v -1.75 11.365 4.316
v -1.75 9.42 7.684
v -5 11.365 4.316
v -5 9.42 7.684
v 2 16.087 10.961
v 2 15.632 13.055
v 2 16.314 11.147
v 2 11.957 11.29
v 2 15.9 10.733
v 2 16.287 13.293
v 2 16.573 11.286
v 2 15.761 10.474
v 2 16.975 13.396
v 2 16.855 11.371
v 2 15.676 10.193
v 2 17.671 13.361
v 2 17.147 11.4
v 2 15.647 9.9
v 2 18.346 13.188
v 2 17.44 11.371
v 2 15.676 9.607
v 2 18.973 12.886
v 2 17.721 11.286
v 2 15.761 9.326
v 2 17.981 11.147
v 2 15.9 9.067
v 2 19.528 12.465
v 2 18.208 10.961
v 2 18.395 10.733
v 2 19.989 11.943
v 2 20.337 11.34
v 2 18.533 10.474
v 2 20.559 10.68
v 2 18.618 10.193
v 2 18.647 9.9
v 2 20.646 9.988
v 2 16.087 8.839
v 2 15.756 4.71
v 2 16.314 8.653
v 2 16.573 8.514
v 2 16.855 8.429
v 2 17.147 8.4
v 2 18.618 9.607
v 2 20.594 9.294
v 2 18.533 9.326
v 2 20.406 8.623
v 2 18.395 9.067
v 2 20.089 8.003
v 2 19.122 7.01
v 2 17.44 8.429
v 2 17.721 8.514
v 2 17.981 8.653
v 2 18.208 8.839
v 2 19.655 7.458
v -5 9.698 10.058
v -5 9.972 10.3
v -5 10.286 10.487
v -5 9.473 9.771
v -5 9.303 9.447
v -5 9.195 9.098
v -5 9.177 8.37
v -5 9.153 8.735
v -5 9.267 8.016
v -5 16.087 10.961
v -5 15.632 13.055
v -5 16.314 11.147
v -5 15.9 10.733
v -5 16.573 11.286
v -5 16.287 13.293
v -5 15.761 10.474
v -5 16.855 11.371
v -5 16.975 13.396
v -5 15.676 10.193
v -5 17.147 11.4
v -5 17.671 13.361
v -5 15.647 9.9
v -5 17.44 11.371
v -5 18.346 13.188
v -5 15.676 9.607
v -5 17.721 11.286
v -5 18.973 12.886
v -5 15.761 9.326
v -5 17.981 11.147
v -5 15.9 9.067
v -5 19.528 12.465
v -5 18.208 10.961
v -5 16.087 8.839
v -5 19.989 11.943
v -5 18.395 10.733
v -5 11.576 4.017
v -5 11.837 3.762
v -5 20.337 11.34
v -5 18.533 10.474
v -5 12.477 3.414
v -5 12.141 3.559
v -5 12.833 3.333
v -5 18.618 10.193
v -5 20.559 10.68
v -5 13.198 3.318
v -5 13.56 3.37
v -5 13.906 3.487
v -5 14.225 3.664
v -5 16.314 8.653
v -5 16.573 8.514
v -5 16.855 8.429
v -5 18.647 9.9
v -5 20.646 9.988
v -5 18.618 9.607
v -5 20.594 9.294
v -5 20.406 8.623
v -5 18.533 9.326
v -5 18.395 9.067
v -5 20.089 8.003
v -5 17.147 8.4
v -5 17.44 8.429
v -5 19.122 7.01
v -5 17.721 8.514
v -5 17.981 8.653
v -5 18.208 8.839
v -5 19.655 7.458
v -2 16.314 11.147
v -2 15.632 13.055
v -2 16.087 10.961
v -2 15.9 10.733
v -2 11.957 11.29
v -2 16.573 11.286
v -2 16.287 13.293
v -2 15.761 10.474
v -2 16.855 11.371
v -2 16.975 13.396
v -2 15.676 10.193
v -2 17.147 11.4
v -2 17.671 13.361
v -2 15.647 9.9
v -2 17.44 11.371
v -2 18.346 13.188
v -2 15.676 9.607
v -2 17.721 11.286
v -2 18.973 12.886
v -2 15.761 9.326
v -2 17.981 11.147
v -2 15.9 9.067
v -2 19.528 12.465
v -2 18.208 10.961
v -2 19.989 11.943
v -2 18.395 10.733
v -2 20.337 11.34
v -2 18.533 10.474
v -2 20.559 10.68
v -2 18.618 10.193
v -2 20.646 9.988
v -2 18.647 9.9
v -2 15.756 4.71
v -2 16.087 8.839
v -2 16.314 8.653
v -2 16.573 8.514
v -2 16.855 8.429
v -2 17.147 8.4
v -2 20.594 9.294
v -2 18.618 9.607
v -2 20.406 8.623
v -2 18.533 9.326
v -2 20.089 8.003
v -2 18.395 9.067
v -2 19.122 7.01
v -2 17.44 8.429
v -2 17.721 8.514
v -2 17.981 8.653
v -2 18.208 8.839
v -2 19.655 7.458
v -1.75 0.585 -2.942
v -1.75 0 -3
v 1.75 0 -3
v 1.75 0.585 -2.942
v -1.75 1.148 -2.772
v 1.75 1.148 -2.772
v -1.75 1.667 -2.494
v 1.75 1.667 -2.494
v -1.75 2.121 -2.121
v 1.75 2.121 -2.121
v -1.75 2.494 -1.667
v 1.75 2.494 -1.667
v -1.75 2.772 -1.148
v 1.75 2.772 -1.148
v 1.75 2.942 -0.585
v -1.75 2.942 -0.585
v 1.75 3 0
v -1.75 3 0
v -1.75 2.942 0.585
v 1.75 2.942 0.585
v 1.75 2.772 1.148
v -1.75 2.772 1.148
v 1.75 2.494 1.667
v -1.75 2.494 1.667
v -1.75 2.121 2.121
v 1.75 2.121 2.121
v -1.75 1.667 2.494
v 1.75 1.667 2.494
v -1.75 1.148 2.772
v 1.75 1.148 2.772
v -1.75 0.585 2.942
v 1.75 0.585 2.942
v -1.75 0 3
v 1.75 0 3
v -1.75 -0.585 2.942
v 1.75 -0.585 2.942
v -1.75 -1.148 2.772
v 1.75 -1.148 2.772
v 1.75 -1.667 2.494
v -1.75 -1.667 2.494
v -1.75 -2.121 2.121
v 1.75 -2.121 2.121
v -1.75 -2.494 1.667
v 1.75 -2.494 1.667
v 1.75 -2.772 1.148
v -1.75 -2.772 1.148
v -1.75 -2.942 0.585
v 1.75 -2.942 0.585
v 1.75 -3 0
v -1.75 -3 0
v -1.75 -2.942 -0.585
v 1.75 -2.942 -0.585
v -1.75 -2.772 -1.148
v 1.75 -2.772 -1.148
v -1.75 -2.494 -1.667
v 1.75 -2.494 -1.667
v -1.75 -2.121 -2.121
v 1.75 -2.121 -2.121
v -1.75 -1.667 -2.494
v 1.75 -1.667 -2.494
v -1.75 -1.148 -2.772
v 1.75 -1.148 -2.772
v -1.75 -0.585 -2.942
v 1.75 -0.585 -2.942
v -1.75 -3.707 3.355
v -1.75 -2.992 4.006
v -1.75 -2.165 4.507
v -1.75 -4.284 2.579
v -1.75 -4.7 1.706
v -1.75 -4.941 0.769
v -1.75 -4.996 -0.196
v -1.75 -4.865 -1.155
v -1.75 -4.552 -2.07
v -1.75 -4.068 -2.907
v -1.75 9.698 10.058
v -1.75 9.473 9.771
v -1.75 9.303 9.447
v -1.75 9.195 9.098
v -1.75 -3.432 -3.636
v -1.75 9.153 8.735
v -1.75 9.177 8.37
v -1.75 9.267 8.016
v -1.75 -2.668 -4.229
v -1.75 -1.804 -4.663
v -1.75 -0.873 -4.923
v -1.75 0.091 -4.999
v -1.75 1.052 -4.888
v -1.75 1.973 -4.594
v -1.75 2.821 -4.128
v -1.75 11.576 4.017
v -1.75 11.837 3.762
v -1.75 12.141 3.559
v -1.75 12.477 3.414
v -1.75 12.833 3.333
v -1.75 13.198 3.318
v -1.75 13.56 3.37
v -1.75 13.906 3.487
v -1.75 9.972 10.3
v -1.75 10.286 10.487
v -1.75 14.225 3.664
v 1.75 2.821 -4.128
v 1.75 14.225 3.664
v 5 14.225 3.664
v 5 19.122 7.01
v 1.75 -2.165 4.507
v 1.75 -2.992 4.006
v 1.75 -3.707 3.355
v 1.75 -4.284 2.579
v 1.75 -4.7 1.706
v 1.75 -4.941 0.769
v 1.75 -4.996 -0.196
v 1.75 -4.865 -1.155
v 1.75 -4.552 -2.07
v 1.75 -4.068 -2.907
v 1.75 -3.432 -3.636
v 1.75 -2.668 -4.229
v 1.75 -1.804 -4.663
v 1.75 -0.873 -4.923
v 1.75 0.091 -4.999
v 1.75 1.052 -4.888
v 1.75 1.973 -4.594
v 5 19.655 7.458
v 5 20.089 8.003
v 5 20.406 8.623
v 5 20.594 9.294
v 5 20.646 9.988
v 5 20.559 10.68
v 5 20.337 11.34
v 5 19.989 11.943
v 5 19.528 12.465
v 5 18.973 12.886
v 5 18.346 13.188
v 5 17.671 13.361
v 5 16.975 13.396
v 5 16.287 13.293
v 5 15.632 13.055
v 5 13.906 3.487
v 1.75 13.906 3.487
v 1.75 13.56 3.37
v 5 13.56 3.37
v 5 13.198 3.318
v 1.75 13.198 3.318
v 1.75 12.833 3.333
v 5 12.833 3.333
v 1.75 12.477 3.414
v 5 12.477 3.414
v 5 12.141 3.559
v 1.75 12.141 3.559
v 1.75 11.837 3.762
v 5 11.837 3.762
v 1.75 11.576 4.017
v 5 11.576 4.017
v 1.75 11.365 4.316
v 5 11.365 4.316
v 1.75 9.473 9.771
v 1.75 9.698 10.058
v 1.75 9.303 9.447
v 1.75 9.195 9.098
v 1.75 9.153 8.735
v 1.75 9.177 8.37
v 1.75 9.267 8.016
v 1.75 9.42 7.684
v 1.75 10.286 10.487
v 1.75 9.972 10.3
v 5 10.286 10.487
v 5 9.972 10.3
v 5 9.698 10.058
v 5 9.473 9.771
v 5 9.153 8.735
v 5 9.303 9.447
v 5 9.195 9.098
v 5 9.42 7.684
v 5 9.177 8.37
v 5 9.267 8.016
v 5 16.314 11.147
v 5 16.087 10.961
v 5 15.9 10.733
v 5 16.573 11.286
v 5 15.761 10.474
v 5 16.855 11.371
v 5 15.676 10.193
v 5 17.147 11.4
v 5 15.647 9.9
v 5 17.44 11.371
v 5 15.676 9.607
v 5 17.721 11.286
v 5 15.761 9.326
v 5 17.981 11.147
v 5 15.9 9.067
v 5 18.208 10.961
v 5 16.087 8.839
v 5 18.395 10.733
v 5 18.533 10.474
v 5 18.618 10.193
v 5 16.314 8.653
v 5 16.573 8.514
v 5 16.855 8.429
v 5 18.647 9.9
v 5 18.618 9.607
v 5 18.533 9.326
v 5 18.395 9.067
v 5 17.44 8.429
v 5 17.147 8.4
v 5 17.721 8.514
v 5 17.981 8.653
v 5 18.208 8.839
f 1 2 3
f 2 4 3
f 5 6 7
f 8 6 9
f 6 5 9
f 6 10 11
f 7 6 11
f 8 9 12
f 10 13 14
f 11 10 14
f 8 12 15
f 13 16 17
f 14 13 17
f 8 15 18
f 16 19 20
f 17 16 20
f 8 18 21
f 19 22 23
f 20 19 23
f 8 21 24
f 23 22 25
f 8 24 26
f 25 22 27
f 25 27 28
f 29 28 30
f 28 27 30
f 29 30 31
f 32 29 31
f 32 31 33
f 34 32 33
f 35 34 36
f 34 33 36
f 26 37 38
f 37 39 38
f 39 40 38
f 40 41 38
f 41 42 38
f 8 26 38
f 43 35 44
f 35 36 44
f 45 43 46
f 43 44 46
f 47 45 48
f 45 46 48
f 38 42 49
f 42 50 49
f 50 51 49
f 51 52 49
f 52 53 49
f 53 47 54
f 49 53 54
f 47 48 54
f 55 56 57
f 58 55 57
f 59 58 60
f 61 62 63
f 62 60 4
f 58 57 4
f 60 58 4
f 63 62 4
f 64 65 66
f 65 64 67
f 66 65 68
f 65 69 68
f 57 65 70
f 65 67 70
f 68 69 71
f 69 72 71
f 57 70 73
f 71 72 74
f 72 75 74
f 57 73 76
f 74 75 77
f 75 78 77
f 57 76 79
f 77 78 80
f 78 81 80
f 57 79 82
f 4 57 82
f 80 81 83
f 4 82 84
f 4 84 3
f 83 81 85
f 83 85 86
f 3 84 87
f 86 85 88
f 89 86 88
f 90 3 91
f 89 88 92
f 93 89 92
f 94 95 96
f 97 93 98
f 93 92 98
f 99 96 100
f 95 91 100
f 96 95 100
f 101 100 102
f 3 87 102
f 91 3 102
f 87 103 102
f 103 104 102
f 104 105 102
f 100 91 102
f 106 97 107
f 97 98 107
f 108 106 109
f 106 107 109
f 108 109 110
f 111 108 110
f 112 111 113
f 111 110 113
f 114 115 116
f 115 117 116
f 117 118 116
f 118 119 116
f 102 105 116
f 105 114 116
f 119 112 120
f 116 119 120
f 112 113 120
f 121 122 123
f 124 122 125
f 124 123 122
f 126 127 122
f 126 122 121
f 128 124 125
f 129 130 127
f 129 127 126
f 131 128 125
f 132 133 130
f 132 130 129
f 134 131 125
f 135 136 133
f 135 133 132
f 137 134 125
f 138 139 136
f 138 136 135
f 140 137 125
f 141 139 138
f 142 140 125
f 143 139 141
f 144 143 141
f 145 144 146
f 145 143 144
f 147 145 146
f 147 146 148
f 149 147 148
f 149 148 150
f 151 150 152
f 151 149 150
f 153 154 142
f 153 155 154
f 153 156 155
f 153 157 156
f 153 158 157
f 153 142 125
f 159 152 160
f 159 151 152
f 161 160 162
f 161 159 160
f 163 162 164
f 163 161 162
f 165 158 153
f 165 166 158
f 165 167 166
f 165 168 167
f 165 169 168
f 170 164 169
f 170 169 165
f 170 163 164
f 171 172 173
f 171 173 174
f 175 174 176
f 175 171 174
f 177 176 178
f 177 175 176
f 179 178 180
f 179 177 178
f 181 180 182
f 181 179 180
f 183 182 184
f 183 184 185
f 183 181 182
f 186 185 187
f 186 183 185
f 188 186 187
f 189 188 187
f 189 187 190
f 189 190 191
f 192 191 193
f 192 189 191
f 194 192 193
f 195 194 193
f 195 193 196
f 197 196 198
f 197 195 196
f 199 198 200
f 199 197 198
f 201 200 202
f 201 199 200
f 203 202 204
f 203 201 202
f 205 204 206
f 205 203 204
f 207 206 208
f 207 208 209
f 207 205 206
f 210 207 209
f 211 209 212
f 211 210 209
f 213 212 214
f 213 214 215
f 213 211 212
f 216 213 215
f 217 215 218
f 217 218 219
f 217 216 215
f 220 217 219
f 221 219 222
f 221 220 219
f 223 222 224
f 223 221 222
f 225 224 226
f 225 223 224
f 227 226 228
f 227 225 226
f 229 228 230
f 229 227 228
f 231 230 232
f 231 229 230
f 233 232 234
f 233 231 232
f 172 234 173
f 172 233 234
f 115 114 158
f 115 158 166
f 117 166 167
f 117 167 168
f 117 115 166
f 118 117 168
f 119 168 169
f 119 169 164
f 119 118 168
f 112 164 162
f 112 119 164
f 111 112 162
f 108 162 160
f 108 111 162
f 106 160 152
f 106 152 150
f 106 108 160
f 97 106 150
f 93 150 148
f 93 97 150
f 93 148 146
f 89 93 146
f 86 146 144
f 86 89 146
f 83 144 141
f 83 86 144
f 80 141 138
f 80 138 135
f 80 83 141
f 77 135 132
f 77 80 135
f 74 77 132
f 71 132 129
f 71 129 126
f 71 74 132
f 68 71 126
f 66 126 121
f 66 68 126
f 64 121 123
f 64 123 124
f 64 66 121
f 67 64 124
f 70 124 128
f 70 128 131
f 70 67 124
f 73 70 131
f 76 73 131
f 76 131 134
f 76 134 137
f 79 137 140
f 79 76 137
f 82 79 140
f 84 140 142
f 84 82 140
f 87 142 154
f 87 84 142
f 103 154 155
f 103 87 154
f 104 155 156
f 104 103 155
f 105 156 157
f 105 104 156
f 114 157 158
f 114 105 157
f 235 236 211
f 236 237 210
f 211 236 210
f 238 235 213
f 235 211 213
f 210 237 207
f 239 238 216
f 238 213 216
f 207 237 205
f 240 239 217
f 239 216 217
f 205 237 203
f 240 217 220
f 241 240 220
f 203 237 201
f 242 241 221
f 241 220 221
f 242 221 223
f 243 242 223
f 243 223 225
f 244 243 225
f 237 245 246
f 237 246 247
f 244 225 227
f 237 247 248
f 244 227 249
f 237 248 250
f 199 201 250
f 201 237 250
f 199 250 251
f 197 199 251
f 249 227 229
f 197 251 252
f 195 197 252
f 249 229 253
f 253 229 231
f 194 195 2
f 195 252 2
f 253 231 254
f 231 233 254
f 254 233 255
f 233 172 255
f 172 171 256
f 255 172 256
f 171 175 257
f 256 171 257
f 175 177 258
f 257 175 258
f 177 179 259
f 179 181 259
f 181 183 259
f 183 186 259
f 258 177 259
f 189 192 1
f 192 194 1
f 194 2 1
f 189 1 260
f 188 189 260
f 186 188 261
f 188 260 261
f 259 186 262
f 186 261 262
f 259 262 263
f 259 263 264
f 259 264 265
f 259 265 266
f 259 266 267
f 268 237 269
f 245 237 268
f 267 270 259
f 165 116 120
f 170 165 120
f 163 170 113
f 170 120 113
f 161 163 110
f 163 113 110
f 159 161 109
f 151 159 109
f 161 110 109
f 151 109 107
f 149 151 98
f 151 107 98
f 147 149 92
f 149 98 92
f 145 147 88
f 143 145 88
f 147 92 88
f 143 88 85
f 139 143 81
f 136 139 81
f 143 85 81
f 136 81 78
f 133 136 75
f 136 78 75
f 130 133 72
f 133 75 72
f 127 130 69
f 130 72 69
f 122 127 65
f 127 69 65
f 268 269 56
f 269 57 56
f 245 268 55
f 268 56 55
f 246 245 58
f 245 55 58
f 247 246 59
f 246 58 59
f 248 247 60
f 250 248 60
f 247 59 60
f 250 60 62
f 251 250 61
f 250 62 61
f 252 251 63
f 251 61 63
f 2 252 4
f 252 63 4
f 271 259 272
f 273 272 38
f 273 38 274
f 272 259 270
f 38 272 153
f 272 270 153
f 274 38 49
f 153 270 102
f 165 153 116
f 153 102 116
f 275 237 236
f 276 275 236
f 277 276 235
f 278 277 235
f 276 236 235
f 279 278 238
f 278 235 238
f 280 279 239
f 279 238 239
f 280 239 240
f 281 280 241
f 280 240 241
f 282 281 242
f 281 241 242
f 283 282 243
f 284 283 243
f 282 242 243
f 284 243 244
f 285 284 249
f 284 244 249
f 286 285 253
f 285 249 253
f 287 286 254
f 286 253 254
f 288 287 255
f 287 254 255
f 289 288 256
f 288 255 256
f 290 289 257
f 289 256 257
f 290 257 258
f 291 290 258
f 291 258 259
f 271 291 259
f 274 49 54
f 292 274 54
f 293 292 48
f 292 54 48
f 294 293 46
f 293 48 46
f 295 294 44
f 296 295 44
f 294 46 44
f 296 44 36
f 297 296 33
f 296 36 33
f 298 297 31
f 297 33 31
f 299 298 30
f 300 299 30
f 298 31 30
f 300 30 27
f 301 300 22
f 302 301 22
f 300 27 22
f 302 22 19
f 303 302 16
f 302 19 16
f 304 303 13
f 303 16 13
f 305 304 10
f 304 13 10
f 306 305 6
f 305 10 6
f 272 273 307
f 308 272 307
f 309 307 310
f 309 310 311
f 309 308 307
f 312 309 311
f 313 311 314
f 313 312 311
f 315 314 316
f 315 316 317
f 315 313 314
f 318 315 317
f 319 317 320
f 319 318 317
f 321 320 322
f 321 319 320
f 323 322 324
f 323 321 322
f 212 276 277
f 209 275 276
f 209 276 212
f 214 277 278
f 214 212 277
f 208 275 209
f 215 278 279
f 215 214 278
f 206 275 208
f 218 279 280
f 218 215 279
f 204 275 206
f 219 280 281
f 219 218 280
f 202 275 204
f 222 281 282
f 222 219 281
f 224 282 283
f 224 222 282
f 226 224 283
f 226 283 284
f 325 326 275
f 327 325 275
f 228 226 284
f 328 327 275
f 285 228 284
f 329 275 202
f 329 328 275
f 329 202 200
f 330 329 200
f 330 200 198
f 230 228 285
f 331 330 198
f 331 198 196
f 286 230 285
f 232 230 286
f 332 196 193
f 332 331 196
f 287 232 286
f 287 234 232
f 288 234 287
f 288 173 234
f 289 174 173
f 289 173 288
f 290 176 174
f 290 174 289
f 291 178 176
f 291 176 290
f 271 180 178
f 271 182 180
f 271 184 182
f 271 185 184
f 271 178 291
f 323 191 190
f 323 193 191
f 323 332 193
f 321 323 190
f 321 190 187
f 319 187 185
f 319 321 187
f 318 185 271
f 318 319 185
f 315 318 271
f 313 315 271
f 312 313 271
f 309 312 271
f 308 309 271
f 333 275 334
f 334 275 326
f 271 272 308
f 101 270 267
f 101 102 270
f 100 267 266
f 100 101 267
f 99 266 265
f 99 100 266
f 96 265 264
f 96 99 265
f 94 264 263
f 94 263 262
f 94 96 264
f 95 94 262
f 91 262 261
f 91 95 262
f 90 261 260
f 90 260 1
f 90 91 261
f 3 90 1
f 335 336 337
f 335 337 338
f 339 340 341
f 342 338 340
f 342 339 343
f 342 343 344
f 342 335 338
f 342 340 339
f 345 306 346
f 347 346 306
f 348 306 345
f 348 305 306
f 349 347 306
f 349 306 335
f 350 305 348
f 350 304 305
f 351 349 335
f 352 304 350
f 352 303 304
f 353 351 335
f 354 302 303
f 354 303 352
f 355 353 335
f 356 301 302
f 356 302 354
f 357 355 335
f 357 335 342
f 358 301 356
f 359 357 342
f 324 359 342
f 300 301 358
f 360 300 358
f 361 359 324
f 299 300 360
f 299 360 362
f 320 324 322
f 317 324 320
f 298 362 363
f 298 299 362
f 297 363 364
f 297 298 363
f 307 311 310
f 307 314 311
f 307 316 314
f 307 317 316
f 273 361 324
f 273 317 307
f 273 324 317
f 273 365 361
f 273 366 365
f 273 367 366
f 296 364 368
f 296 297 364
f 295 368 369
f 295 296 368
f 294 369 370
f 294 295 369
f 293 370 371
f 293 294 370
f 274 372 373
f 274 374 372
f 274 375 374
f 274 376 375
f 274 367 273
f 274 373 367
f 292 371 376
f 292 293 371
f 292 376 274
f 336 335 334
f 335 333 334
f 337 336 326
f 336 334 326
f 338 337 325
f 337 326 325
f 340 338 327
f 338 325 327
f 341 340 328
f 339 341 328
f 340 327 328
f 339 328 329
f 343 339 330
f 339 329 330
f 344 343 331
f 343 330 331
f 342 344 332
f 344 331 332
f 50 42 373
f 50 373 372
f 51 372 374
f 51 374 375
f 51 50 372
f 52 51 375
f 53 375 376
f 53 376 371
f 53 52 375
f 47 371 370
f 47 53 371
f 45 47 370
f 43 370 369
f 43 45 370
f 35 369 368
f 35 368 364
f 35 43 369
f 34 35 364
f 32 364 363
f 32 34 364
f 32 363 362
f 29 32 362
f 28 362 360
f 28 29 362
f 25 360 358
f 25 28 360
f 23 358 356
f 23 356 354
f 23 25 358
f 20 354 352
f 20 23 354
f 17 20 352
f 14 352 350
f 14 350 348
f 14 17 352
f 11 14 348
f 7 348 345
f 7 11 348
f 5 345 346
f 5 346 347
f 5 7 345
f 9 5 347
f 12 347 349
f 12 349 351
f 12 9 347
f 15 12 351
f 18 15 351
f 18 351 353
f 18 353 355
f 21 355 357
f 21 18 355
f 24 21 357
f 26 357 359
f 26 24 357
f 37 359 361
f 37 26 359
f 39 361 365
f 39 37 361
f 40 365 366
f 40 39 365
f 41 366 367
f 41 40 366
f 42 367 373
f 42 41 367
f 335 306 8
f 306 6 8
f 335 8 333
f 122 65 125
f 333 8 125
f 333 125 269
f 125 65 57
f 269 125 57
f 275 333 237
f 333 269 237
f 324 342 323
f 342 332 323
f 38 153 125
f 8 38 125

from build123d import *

# Parameters (mm, degrees)
BOSS_EXTRUDE1_DEPTH      = 1.75
BOSS_EXTRUDE1_DEPTH_BACK = 1.75
SKETCH1_R                = 5
SKETCH1_R_2              = 3
BOSS_EXTRUDE4_DEPTH      = 2
BOSS_EXTRUDE4_DEPTH_BACK = 2
BOSS_EXTRUDE2_START      = 2
SKETCH1_3_R              = 3.4999999999999996
SKETCH1_3_R_2            = 1.5000000000000024
BOSS_EXTRUDE2_DEPTH      = 3
BOSS_EXTRUDE3_START      = -5
SKETCH1_4_R              = 3.4999999999999996
SKETCH1_4_R_2            = 1.5000000000000024
BOSS_EXTRUDE3_DEPTH      = 3
FILLET2_R                = 2


with BuildPart() as part:
    # Sketch1 → Boss-Extrude1 (new, two sides: drawn at the far end of the back side and taken through both)
    # profile 1 of 3: a face of its own
    with BuildSketch(Plane(origin=(0, 0, 0), x_dir=(0, 0, -1), z_dir=(1, 0, 0)).offset(-BOSS_EXTRUDE1_DEPTH_BACK)):
        with BuildLine():
            Line((4.128289444917901, 2.820855589883948), (-2.446958304851689, 12.443654424549113))
            Line((-2.4469583048516905, 12.443654424549113), (-9.553041695148336, 8.340955266277398))
            Line((-9.553041695148337, 8.340955266277398), (-4.507077323705776, -2.1647757385320965))
            ThreePointArc((-4.507077323705776, -2.1647757385320965), (-2.500000000000005, 4.33012701892219), (4.128289444917895, 2.8208555898839442))
        make_face()
    # profile 2 of 3: a face of its own
    with BuildSketch(Plane(origin=(0, 0, 0), x_dir=(0, 0, -1), z_dir=(1, 0, 0)).offset(-BOSS_EXTRUDE1_DEPTH_BACK)):
        Circle(SKETCH1_R)
        Circle(SKETCH1_R_2, mode=Mode.SUBTRACT)
    # profile 3 of 3: a face of its own
    with BuildSketch(Plane(origin=(0, 0, 0), x_dir=(0, 0, -1), z_dir=(1, 0, 0)).offset(-BOSS_EXTRUDE1_DEPTH_BACK)):
        Polygon((-2.446958304851689, 12.443654424549113), (-4.710146578566388, 15.755804219010134), (-11.289853421433653, 11.957008702091882), (-9.553041695148337, 8.340955266277398), align=None)
    extrude(amount=BOSS_EXTRUDE1_DEPTH + BOSS_EXTRUDE1_DEPTH_BACK)

    # Sketch1<5> → Boss-Extrude4 (add, two sides: drawn at the far end of the back side and taken through both)
    with BuildSketch(Plane(origin=(0, 0, 0), x_dir=(0, 0, -1), z_dir=(1, 0, 0)).offset(-BOSS_EXTRUDE4_DEPTH_BACK)):
        Polygon((-2.446958304851689, 12.443654424549113), (-4.710146578566388, 15.755804219010134), (-11.289853421433653, 11.957008702091882), (-9.553041695148337, 8.340955266277398), align=None)
    extrude(amount=BOSS_EXTRUDE4_DEPTH + BOSS_EXTRUDE4_DEPTH_BACK)

    # Sketch1<3> → Boss-Extrude2 (add)
    # profile 1 of 3: a face of its own
    with BuildSketch(Plane(origin=(0, 0, 0), x_dir=(0, 0, -1), z_dir=(1, 0, 0)).offset(BOSS_EXTRUDE2_START)):
        Polygon((-2.446958304851689, 12.443654424549113), (-4.710146578566388, 15.755804219010134), (-11.289853421433653, 11.957008702091882), (-9.553041695148337, 8.340955266277398), align=None)
    # profile 2 of 3: a face of its own
    with BuildSketch(Plane(origin=(0, 0, 0), x_dir=(0, 0, -1), z_dir=(1, 0, 0)).offset(BOSS_EXTRUDE2_START)):
        with BuildLine():
            Line((-4.710146578566388, 15.755804219010134), (-7.0101973885575, 19.12190190785064))
            ThreePointArc((-7.010197388557501, 19.12190190785064), (-6.556027127797799, 18.18066906268114), (-6.400000000000027, 17.147302994931877))
            ThreePointArc((-6.400000000000027, 17.147302994931877), (-9.122934829978606, 13.734654504164101), (-13.054954126594069, 15.63195997795941))
            Line((-13.054954126594073, 15.631959977959408), (-11.289853421433653, 11.957008702091882))
            Line((-11.289853421433653, 11.957008702091882), (-4.7101465785663885, 15.755804219010134))
        make_face()
    # profile 3 of 3: a face of its own
    with BuildSketch(Plane(origin=(0, 0, 0), x_dir=(0, 0, -1), z_dir=(1, 0, 0)).offset(BOSS_EXTRUDE2_START)):
        with Locations((-9.900000000000027, 17.147302994931877)):
            Circle(SKETCH1_3_R)
        with Locations((-9.900000000000027, 17.147302994931877)):
            Circle(SKETCH1_3_R_2, mode=Mode.SUBTRACT)
    extrude(amount=BOSS_EXTRUDE2_DEPTH)

    # Sketch1<4> → Boss-Extrude3 (add)
    # profile 1 of 3: a face of its own
    with BuildSketch(Plane(origin=(0, 0, 0), x_dir=(0, 0, -1), z_dir=(1, 0, 0)).offset(BOSS_EXTRUDE3_START)):
        with BuildLine():
            Line((-4.710146578566388, 15.755804219010134), (-7.0101973885575, 19.12190190785064))
            ThreePointArc((-7.010197388557501, 19.12190190785064), (-6.556027127797799, 18.18066906268114), (-6.400000000000027, 17.147302994931877))
            ThreePointArc((-6.400000000000027, 17.147302994931877), (-9.122934829978606, 13.734654504164101), (-13.054954126594069, 15.63195997795941))
            Line((-13.054954126594073, 15.631959977959408), (-11.289853421433653, 11.957008702091882))
            Line((-11.289853421433653, 11.957008702091882), (-4.7101465785663885, 15.755804219010134))
        make_face()
    # profile 2 of 3: a face of its own
    with BuildSketch(Plane(origin=(0, 0, 0), x_dir=(0, 0, -1), z_dir=(1, 0, 0)).offset(BOSS_EXTRUDE3_START)):
        Polygon((-2.446958304851689, 12.443654424549113), (-4.710146578566388, 15.755804219010134), (-11.289853421433653, 11.957008702091882), (-9.553041695148337, 8.340955266277398), align=None)
    # profile 3 of 3: a face of its own
    with BuildSketch(Plane(origin=(0, 0, 0), x_dir=(0, 0, -1), z_dir=(1, 0, 0)).offset(BOSS_EXTRUDE3_START)):
        with Locations((-9.900000000000027, 17.147302994931877)):
            Circle(SKETCH1_4_R)
        with Locations((-9.900000000000027, 17.147302994931877)):
            Circle(SKETCH1_4_R_2, mode=Mode.SUBTRACT)
    extrude(amount=BOSS_EXTRUDE3_DEPTH)

    # Fillet2
    fillet2_edges = [part.edges().sort_by_distance(p)[0] for p in [
        (-3.375, 12.443654424549113, 2.4469583048516905),
        (-3.375, 8.340955266277398, 9.553041695148337),
        (3.375, 12.443654424549113, 2.44695830485169),
        (3.375, 8.340955266277398, 9.553041695148337),
    ]]
    fillet(fillet2_edges, radius=FILLET2_R)


solid = part.part
